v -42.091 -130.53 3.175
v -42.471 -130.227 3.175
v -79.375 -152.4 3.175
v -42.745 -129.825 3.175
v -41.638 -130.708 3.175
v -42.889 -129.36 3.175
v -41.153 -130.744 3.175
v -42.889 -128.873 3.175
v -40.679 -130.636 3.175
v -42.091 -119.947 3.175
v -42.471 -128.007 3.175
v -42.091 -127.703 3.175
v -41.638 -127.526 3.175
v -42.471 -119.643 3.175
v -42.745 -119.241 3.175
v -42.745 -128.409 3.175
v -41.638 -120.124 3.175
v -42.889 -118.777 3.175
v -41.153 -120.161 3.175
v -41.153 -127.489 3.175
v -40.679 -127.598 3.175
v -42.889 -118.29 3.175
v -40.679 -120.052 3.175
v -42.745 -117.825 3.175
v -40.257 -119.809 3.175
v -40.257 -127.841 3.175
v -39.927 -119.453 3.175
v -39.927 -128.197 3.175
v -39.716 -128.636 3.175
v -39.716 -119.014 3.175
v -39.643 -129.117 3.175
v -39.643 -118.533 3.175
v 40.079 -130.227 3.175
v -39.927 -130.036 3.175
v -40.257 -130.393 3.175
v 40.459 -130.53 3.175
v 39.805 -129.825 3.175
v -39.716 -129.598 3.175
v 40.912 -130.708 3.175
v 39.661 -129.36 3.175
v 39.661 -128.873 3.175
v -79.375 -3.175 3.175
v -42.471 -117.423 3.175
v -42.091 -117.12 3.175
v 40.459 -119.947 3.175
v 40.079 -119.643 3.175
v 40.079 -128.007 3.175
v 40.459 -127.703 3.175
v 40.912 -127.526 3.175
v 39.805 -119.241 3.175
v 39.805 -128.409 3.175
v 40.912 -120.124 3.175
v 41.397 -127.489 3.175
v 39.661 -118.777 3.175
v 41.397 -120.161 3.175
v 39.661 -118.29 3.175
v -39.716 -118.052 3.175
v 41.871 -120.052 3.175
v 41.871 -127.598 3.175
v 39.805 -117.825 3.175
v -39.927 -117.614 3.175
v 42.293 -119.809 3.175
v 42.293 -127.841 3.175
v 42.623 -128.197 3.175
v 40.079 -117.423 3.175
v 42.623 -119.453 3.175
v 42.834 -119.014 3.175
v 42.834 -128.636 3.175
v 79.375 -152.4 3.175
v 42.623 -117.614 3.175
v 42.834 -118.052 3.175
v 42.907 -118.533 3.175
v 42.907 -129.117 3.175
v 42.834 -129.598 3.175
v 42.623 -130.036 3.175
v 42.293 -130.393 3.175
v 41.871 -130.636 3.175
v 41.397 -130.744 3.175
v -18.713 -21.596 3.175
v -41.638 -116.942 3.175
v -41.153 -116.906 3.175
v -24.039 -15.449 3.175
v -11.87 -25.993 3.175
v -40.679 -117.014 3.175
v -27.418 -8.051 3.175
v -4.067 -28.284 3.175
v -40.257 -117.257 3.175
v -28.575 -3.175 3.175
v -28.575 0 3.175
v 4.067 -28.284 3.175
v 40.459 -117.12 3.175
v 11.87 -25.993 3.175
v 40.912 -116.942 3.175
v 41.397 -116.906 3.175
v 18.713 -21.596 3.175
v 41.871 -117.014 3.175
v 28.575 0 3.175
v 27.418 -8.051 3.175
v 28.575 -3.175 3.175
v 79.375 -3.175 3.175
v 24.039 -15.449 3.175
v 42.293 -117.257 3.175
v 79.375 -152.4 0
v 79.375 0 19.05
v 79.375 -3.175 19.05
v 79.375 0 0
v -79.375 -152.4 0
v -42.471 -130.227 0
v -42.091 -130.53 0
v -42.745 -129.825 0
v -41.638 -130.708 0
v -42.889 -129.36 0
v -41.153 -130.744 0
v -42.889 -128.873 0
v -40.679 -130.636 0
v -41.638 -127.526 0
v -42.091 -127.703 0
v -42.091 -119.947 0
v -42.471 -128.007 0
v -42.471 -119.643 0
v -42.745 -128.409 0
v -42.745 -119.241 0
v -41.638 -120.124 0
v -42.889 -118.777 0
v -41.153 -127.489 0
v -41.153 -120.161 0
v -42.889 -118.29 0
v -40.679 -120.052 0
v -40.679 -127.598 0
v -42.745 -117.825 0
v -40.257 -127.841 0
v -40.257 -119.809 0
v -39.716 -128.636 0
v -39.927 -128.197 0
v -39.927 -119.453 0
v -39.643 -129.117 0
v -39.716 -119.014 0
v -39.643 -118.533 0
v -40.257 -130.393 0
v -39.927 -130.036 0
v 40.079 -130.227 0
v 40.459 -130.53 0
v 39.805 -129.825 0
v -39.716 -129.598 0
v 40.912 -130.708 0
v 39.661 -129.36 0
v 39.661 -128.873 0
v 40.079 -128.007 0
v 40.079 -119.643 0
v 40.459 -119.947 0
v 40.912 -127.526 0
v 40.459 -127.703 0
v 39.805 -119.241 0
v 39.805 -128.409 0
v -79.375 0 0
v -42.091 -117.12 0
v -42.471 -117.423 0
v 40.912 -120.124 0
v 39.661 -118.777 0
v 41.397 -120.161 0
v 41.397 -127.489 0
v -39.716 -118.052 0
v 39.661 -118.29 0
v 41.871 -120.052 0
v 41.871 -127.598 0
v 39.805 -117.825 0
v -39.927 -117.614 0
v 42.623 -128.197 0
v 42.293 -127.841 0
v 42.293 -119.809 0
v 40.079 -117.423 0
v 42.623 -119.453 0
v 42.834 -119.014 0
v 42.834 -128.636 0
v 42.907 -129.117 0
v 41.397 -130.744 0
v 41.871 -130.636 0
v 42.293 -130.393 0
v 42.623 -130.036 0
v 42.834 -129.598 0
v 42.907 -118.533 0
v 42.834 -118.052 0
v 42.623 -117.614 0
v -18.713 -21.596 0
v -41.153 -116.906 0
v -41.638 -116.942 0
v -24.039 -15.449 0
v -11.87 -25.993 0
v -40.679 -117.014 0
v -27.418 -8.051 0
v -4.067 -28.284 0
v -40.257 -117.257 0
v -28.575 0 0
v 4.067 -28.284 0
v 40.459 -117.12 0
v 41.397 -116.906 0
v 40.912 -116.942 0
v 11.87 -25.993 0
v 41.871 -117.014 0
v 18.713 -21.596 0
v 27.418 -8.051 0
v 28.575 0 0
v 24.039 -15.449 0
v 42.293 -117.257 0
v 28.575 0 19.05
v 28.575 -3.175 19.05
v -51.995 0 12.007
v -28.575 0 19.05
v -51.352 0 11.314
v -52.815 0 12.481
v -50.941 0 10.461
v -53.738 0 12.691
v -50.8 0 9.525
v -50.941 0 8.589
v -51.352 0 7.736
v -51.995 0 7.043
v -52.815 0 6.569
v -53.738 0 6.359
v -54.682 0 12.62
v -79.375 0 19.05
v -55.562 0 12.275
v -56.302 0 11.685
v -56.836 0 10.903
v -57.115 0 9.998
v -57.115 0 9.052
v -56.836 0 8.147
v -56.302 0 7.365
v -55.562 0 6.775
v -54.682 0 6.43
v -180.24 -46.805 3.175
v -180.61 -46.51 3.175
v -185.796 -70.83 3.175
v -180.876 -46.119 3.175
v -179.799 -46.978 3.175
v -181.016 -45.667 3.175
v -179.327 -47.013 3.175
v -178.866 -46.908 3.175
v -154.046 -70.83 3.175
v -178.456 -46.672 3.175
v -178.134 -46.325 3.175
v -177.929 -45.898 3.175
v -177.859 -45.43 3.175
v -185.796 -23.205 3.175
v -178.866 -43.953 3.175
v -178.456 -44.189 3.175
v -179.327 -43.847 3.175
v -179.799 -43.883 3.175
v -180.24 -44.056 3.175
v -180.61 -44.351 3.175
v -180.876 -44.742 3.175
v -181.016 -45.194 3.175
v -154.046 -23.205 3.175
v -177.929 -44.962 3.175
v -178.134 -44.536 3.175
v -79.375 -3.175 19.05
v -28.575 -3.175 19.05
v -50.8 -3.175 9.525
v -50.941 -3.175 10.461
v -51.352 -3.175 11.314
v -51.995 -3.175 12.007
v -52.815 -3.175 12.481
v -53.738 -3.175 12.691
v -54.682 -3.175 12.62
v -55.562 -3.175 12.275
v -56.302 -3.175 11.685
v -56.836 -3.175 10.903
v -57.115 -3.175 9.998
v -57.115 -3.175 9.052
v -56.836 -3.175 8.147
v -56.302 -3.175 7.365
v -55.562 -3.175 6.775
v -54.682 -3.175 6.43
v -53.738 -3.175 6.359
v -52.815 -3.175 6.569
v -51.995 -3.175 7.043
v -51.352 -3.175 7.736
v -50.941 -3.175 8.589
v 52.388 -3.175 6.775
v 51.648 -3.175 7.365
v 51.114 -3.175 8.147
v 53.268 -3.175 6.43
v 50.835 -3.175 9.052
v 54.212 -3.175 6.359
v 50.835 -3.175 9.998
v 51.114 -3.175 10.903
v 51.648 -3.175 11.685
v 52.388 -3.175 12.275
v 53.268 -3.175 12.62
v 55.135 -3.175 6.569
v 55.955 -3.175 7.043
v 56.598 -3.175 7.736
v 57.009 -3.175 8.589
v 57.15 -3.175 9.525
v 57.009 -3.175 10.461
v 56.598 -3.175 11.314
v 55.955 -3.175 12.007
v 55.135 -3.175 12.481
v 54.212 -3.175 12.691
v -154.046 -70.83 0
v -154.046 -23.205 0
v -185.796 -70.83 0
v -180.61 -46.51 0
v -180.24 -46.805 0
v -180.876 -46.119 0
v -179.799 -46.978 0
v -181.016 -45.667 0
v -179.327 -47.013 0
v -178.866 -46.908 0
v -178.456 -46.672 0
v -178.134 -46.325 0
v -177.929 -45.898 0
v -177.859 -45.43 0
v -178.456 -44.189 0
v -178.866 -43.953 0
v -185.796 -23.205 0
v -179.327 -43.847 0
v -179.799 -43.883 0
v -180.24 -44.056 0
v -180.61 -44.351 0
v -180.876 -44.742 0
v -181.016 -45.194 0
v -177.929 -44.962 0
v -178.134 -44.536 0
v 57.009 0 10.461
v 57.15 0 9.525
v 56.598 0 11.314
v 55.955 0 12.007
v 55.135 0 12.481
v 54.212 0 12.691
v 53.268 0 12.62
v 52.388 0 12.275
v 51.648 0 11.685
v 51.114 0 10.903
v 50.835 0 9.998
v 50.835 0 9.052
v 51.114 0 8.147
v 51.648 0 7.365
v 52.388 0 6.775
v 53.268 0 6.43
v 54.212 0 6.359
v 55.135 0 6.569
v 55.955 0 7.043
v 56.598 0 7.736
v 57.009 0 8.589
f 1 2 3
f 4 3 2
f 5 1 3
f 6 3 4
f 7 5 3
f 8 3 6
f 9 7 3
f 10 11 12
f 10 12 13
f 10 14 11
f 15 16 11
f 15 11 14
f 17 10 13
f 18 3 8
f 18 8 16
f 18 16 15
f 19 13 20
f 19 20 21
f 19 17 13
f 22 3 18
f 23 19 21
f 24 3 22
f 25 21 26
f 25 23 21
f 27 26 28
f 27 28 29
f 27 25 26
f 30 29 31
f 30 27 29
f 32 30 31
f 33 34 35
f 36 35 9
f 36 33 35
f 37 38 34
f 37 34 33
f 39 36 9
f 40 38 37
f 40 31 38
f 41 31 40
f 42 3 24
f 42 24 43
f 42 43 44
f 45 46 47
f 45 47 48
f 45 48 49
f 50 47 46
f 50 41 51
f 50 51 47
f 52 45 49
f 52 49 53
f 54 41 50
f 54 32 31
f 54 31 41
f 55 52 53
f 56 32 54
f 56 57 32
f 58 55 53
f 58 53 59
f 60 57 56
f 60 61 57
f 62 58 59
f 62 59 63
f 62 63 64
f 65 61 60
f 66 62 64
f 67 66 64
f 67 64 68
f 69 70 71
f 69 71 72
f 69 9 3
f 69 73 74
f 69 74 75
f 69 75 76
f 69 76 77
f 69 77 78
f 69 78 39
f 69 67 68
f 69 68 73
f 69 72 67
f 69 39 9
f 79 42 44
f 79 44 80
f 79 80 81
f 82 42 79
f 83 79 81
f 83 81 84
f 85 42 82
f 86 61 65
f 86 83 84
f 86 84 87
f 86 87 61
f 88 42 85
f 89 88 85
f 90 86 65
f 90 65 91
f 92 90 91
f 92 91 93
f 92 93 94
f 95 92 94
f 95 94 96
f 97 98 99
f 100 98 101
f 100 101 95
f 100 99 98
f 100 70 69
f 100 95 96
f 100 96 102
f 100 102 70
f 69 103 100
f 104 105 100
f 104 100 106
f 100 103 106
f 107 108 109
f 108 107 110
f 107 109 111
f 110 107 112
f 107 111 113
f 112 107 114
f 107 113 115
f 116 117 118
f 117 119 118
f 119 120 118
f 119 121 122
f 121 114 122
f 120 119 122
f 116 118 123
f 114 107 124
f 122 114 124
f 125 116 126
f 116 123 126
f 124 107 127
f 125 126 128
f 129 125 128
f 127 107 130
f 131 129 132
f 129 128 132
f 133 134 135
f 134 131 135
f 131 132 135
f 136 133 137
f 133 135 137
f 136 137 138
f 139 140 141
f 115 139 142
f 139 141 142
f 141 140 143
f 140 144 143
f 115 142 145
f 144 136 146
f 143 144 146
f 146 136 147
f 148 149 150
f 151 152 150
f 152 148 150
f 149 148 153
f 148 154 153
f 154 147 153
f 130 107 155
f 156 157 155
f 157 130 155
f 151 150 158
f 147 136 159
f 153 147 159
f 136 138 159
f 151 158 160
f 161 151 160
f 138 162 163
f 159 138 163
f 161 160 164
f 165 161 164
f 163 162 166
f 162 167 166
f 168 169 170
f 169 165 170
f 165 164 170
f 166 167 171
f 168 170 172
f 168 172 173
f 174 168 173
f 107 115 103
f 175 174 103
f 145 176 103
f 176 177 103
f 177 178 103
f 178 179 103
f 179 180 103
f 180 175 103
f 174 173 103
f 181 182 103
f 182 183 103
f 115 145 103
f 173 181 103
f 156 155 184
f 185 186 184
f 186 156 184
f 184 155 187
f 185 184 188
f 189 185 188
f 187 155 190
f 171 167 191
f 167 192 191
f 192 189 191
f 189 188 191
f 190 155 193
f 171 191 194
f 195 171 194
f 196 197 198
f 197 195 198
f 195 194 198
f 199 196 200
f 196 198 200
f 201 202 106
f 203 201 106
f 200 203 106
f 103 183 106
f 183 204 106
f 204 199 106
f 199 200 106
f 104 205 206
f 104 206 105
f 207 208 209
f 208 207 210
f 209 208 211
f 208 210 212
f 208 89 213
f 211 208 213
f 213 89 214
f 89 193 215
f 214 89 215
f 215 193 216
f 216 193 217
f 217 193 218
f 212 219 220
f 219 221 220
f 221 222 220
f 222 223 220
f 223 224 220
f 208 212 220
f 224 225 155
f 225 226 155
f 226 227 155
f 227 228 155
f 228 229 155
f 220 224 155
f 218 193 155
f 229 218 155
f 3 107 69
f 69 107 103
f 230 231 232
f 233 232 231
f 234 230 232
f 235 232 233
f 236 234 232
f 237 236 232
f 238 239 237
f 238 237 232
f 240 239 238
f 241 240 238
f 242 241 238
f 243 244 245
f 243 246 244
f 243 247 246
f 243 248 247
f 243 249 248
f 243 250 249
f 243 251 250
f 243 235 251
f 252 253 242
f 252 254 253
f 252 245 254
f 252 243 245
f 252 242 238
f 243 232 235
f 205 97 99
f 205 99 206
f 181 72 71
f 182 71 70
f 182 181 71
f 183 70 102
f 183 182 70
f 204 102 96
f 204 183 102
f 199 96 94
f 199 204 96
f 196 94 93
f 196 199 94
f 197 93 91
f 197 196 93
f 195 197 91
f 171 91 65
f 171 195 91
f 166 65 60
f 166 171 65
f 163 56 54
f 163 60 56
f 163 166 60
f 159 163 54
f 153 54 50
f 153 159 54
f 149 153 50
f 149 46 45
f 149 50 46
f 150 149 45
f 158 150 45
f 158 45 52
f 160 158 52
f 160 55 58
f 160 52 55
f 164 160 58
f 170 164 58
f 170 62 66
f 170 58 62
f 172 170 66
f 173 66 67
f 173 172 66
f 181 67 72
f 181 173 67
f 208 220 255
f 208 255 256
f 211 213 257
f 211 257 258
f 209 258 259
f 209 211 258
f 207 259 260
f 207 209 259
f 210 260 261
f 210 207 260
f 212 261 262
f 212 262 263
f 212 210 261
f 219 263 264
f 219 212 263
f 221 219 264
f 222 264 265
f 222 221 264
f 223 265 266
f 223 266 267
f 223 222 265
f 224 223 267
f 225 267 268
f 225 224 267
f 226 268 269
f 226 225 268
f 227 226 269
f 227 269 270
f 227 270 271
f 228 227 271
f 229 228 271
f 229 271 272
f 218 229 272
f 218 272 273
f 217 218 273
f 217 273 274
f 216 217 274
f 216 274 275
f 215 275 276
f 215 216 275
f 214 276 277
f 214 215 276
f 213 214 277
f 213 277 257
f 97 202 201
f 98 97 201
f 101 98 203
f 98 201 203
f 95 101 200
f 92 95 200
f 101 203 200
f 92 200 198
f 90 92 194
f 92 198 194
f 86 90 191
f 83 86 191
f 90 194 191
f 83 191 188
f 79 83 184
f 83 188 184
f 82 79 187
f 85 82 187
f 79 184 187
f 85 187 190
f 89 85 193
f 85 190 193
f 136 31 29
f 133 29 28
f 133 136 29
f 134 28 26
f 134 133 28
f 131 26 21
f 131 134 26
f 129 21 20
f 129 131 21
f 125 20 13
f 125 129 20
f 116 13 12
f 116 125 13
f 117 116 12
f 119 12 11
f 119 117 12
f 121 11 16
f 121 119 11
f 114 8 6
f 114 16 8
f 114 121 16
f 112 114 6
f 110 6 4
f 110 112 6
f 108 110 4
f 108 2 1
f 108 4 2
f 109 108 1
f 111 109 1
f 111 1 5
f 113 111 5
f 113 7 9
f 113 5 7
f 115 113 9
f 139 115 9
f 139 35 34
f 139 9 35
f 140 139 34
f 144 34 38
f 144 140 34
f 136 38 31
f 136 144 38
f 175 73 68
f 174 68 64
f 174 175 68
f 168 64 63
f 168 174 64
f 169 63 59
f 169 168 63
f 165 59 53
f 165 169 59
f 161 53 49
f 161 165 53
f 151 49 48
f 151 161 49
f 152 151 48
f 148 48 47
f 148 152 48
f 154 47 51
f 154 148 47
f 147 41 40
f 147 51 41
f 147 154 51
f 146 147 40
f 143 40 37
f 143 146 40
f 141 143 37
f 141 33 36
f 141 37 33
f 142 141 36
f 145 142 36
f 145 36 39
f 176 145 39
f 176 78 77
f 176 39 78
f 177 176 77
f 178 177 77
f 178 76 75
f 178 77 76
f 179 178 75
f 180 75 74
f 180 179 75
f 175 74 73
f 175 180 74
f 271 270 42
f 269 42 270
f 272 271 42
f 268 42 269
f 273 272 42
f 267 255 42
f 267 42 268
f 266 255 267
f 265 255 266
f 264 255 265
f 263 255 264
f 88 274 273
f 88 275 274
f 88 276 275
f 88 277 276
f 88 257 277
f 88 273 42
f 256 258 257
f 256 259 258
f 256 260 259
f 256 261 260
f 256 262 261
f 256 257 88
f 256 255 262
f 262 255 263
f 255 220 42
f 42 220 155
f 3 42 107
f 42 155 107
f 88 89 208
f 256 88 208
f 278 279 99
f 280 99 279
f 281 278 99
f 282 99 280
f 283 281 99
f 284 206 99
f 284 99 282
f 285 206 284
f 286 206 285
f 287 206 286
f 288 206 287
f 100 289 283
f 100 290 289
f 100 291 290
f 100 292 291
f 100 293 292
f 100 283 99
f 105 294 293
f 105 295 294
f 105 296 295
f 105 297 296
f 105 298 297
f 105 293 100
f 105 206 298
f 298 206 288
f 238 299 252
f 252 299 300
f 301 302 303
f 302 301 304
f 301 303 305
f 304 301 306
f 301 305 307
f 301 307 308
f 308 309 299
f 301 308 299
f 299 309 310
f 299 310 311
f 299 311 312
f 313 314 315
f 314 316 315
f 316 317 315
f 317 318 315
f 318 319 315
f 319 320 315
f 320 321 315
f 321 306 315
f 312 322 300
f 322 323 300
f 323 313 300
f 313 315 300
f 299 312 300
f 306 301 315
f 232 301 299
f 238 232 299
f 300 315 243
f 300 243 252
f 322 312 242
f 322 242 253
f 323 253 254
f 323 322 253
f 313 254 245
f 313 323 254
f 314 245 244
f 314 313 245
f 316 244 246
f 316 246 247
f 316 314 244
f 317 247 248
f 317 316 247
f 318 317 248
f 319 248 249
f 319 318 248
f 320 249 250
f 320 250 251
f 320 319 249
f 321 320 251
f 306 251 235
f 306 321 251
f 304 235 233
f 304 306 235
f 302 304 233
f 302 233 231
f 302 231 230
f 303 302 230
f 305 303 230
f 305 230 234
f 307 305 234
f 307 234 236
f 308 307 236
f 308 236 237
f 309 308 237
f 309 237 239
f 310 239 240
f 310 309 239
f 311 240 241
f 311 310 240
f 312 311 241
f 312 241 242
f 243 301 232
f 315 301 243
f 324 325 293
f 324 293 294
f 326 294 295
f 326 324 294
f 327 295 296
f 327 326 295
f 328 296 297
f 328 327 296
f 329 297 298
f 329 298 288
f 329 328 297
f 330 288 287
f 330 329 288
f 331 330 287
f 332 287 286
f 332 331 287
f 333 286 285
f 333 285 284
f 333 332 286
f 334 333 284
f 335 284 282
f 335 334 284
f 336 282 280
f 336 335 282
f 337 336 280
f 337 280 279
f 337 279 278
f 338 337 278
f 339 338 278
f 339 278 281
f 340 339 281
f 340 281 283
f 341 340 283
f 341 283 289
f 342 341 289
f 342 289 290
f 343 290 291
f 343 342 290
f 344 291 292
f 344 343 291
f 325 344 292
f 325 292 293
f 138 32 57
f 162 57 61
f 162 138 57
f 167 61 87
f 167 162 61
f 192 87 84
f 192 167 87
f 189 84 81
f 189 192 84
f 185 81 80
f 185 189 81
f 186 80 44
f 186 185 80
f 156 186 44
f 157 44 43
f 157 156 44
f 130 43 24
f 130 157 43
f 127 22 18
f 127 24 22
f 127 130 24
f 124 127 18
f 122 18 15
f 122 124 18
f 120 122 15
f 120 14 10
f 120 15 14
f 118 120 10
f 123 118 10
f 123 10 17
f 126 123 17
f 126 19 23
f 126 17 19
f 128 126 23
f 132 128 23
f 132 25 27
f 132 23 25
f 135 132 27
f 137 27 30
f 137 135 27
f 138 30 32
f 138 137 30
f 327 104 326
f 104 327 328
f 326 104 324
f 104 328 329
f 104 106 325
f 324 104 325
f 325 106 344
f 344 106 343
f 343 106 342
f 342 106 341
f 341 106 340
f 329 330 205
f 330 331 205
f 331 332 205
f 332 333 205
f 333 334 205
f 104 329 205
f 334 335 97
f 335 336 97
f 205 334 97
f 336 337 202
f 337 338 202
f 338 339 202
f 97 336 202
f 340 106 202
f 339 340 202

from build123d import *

# Parameters (mm, degrees)
F2_DEPTH = 3.175
F1_W     = 50.8
F1_H     = 19.05
F1_R     = 3.175
F3_DEPTH = 3.175
F5_W     = 31.75
F5_H     = 47.625
F5_R     = 1.5875
F6_DEPTH = 3.175
F7_R     = 1.63195
F8_DEPTH = 39.37


# Not quite as in the source:
# - a feature names something its author has since deleted; it is built from what else it names


with BuildPart() as f2:
    # F0 (on Top) → F2 (new body)
    with BuildSketch(Plane.XY):
        with BuildLine():
            Line((-28.575, 0), (-79.375, 0))
            Line((-79.375, 0), (-79.375, -152.4))
            Line((-79.375, -152.4), (79.375, -152.4))
            Line((79.375, -152.4), (79.375, 0))
            Line((79.375, 0), (28.575, 0))
            ThreePointArc((28.575, 0), (0, -28.575), (-28.575, 0))
        make_face()
    extrude(amount=F2_DEPTH)

    # F1 (on Front) → F3 (join)
    with BuildSketch(Plane.XZ):
        with Locations((53.975, 9.525)):
            Rectangle(F1_W, F1_H)
        with Locations((53.975, 9.525)):
            Circle(F1_R, mode=Mode.SUBTRACT)
        with Locations((-53.975, 9.525)):
            Rectangle(F1_W, F1_H)
        with Locations((-53.975, 9.525)):
            Circle(F1_R, mode=Mode.SUBTRACT)
    extrude(amount=F3_DEPTH)

    # F7 (on Top) → F8 (cut)
    with BuildSketch(Plane.XY):
        with Locations((-41.275, -118.5333333333)):
            Circle(F7_R)
        with Locations((-41.275, -129.1166666667)):
            Circle(F7_R)
        with Locations((41.275, -118.5333333333)):
            Circle(F7_R)
        with Locations((41.275, -129.1166666667)):
            Circle(F7_R)
    extrude(amount=F8_DEPTH, mode=Mode.SUBTRACT)


with BuildPart() as f6:
    # F5 (on Top) → F6 (new body)
    with BuildSketch(Plane.XY):
        with Locations((-169.9210062872, -47.0178964723)):
            Rectangle(F5_W, F5_H)
        with Locations((-179.4460062872, -45.4303964723)):
            Circle(F5_R, mode=Mode.SUBTRACT)
    extrude(amount=F6_DEPTH)


solid = Compound([f2.part, f6.part])
